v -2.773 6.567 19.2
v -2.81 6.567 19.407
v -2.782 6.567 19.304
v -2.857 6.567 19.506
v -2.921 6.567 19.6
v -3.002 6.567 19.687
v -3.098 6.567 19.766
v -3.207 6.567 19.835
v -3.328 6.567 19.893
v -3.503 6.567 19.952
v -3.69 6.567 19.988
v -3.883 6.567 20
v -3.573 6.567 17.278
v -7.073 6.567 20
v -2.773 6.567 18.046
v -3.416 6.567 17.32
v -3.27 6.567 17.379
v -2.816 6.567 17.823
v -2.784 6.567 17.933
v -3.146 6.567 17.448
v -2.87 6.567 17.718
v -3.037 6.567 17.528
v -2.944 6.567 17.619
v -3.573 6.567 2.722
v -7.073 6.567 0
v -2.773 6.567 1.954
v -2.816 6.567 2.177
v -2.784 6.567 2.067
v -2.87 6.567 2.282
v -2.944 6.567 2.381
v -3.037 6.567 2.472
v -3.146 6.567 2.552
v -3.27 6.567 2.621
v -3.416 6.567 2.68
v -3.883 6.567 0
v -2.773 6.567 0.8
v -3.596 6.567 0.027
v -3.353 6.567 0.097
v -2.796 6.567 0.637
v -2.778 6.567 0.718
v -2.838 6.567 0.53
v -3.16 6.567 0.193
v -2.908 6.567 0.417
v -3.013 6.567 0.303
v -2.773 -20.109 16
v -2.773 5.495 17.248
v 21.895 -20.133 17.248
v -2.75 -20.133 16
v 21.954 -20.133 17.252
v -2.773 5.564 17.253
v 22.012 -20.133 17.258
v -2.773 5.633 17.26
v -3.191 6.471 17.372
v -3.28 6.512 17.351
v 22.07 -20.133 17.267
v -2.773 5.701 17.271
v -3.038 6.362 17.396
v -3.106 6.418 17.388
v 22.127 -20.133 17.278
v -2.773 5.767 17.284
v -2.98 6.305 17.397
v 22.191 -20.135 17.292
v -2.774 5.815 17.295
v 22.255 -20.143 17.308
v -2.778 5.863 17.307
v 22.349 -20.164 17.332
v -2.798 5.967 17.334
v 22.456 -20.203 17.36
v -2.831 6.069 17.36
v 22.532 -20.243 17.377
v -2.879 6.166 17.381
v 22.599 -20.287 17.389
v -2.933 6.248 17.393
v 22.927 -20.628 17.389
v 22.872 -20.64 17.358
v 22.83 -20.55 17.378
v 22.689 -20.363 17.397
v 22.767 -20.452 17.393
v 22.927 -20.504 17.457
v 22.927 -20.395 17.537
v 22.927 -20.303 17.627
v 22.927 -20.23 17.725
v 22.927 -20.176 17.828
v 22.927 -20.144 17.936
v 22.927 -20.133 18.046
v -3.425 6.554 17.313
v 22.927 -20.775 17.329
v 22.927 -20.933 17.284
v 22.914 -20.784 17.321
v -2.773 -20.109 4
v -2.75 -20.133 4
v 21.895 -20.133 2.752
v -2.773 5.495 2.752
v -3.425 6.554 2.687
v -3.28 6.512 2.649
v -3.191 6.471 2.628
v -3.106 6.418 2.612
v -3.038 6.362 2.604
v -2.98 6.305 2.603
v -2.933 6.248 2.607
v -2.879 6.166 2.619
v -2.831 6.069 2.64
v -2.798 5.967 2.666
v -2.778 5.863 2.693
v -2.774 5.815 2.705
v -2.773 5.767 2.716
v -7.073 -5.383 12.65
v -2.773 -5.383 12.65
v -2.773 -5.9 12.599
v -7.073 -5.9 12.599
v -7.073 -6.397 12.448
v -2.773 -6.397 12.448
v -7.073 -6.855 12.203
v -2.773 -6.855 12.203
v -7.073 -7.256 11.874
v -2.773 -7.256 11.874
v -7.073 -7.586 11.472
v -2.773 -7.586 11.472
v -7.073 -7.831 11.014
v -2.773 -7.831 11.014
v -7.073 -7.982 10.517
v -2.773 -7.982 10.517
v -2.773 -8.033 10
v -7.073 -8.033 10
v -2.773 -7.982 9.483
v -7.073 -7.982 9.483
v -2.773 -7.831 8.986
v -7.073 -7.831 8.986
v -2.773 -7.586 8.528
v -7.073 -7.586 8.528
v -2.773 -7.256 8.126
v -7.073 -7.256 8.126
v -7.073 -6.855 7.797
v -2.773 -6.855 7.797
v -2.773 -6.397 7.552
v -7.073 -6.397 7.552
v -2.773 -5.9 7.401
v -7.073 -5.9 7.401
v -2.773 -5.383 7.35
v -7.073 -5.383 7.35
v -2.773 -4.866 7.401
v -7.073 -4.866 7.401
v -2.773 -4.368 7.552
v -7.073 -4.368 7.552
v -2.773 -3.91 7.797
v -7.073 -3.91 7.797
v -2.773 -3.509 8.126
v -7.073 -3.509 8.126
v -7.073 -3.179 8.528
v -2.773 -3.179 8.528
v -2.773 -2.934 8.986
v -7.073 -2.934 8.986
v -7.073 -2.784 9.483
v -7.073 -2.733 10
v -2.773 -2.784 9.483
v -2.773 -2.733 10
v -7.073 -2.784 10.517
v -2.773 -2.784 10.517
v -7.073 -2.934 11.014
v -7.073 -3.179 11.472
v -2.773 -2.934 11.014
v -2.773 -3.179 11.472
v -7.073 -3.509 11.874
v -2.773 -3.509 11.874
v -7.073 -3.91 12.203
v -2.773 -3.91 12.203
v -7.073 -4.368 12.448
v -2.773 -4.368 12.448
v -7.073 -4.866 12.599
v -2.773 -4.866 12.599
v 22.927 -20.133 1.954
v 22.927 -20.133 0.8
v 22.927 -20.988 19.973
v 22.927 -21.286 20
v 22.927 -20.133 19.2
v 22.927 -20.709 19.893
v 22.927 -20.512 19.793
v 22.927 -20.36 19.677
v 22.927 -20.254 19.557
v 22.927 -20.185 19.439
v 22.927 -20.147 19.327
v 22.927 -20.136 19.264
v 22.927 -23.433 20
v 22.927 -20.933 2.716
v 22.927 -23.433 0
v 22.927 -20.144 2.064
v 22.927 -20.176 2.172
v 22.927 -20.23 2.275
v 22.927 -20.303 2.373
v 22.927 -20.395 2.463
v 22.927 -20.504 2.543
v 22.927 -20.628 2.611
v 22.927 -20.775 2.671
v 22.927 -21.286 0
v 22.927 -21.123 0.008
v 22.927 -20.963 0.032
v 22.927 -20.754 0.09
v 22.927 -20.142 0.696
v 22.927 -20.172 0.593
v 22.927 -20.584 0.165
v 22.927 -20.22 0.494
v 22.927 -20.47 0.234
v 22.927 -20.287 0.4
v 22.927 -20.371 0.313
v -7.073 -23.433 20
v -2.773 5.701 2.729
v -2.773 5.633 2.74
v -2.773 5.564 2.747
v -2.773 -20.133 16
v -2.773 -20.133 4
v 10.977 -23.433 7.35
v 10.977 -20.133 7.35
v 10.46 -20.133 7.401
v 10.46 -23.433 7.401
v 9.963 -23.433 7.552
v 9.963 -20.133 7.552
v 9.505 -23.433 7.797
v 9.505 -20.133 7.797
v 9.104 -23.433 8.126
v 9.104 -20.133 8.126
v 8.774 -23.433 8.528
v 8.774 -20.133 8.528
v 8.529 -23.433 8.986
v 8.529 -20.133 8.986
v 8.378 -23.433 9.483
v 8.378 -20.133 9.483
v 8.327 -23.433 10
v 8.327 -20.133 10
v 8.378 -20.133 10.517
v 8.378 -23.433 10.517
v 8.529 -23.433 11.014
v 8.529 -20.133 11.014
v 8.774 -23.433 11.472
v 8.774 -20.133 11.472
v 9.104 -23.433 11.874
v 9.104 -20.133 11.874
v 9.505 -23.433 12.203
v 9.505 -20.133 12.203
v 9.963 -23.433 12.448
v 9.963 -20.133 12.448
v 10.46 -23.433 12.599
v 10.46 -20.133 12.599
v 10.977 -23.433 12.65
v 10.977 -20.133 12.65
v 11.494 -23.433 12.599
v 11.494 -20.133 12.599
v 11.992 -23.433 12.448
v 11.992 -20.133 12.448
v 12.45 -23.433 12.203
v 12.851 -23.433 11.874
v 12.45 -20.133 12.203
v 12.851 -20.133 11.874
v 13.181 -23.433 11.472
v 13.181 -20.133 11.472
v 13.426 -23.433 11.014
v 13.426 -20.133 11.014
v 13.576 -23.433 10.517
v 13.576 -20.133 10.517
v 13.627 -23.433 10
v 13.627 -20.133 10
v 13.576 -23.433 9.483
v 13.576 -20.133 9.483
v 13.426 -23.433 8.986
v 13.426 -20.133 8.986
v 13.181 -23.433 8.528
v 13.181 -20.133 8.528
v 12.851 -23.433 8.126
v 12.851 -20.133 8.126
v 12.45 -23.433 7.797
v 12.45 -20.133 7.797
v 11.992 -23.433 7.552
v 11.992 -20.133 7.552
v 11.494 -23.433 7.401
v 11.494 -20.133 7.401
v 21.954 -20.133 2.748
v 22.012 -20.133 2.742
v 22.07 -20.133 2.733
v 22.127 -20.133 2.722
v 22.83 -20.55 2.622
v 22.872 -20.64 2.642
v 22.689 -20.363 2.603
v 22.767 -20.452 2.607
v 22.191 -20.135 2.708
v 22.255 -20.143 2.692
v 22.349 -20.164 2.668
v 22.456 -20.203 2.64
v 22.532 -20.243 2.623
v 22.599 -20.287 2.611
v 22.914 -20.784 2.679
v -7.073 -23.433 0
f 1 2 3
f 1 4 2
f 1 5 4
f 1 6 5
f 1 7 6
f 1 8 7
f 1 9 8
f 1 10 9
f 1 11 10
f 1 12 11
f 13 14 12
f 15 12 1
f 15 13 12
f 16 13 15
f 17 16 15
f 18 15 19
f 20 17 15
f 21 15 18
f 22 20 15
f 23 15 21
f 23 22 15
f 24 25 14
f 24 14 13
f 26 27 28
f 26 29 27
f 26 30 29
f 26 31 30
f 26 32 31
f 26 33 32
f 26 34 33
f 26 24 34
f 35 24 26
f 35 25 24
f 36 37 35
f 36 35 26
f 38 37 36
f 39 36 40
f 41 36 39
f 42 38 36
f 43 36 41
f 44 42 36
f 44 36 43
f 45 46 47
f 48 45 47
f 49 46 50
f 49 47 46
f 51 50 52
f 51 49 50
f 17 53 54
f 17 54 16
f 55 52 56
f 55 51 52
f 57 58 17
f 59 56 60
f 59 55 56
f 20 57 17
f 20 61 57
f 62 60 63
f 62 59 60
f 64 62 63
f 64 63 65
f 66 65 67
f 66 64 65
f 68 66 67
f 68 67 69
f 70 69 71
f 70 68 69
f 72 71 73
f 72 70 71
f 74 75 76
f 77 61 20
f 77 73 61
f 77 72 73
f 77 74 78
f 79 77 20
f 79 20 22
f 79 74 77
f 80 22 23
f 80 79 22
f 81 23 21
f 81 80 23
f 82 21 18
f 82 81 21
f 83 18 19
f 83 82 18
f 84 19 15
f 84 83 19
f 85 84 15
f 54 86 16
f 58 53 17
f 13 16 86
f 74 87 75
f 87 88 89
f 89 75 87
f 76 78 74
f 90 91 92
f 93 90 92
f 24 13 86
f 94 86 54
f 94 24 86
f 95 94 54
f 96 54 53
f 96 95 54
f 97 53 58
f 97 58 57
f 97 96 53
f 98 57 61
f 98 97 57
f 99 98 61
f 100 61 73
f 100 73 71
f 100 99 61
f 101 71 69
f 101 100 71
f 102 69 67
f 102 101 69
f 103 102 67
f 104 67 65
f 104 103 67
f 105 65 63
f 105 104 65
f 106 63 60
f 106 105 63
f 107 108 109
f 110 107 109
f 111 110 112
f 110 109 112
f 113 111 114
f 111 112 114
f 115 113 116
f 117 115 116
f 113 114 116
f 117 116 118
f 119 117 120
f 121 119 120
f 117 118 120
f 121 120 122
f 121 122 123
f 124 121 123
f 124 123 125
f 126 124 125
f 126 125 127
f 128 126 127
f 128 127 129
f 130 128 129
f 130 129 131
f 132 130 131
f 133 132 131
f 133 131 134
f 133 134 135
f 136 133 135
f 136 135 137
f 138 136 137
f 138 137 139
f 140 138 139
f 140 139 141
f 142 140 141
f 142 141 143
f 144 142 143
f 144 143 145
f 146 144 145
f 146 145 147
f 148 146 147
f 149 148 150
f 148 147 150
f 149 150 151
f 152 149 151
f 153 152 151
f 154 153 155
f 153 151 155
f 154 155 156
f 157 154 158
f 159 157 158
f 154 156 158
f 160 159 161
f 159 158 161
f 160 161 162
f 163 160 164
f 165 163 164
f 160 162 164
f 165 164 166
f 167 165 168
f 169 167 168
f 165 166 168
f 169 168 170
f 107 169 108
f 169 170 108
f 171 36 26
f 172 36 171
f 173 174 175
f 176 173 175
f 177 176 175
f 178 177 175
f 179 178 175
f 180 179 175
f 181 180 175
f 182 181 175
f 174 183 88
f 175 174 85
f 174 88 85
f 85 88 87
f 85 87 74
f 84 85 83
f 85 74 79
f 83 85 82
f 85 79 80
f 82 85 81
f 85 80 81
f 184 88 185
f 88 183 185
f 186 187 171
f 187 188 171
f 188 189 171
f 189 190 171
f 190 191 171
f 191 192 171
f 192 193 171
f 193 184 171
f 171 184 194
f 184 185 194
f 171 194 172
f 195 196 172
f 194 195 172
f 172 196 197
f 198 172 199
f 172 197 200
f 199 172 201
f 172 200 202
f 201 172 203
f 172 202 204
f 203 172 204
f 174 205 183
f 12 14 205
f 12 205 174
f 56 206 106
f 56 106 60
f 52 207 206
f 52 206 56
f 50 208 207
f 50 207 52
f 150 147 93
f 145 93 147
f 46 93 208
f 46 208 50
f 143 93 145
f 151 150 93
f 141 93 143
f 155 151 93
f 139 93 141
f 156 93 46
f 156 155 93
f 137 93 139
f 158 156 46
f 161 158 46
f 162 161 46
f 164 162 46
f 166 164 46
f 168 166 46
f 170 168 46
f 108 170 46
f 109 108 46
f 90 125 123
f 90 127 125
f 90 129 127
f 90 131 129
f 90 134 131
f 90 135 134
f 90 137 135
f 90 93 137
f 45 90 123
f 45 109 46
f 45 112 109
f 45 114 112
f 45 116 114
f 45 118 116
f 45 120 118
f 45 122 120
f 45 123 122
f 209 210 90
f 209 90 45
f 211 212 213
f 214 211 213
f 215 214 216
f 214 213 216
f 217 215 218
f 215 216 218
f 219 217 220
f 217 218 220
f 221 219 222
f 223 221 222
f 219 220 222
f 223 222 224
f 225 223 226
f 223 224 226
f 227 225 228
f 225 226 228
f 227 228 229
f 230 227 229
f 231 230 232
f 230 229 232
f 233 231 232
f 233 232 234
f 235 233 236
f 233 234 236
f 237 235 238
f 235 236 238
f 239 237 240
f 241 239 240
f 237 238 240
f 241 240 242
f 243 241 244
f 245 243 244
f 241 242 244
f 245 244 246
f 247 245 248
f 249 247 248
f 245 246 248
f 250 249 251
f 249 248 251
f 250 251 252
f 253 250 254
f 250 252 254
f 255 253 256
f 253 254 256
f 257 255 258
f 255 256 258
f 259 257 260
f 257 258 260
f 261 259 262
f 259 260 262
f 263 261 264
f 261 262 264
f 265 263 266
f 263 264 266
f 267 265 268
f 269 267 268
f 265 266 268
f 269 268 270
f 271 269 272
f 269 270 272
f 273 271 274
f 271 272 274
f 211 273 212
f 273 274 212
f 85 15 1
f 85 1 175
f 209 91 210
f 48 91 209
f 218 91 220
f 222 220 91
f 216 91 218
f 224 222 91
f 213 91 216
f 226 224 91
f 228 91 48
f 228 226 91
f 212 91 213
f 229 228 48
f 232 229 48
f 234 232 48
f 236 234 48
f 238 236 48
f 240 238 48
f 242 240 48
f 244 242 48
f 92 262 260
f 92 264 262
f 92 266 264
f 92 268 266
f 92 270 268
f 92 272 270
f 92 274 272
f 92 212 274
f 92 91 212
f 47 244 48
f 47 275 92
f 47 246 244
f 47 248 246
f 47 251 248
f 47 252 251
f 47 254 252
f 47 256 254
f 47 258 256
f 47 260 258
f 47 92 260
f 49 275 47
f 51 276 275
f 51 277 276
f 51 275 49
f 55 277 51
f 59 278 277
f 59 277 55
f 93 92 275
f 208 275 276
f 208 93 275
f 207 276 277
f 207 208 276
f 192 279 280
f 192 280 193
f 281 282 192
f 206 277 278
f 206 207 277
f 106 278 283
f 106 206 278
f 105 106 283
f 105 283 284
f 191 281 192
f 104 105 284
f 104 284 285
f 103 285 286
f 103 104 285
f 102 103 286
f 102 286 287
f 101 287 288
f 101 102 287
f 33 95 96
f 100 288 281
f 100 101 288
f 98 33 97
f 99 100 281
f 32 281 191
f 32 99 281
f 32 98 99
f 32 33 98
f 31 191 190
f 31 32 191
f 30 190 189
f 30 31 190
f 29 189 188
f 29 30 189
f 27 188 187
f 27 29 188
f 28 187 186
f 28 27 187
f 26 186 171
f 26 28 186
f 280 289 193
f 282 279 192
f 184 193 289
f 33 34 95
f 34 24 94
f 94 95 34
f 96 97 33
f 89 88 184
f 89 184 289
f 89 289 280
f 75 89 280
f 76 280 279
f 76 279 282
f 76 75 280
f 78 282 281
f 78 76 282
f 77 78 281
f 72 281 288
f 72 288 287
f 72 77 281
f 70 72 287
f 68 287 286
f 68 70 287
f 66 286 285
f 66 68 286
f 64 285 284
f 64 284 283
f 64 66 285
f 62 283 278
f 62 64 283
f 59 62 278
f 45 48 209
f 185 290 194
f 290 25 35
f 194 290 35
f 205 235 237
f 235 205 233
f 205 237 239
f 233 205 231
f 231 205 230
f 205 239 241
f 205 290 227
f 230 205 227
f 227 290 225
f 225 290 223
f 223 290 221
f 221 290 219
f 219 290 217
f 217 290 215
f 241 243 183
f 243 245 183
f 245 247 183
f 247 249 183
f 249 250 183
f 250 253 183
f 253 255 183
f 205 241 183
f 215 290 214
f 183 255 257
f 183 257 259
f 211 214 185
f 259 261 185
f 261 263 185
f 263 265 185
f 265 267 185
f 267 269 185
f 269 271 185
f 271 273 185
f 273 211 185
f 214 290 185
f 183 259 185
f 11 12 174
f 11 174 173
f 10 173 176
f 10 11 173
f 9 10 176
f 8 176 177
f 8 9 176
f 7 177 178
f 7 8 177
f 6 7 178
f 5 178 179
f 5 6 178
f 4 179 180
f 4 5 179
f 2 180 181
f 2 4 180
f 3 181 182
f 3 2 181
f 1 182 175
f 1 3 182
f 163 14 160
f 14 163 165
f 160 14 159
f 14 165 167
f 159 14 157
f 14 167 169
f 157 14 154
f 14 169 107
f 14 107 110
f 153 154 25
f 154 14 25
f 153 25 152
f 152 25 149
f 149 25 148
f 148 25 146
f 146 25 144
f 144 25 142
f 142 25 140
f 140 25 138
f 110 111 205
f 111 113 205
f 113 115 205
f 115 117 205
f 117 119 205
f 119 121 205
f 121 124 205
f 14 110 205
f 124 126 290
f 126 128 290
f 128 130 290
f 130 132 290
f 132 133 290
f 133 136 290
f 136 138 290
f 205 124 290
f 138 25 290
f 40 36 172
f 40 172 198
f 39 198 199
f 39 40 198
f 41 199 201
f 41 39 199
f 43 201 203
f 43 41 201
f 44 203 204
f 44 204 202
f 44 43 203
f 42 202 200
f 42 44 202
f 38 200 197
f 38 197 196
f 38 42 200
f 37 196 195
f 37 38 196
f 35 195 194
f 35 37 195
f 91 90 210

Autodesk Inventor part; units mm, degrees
ref_plane "YZ Plane" through (0, 0, 0) normal (1, 0, 0) x (0, 1, 0)
ref_plane "XZ Plane" through (0, 0, 0) normal (0, 1, 0) x (-1, 0, 0)
ref_plane "XY Plane" through (0, 0, 0) normal (0, 0, 1) x (1, 0, 0)
sketch "Szkic1" plane through (0, 0, 0) normal (0, 0, 1) x (1, 0, 0)
  line L0 (-7.0726, 6.5674) -> (-7.0726, -23.4326)
  line L1 (-7.0726, -23.4326) -> (22.9274, -23.4326)
  line L2 (22.9274, -23.4326) -> (22.9274, -20.1326)
  line L3 (-7.0726, 6.5674) -> (-2.7726, 6.5674)
  line L4 (-2.7726, 6.5674) -> (22.9274, -20.1326)
  point P0 (0, 0)
  dimension "d0" = 30
  dimension "d1" = 30
  dimension "d2" = 3.3
  dimension "d3" = 4.3
extrude "Wyciągnięcie proste1" add sketch "Szkic1" along normal blind 20
sketch "Szkic2" plane through (22.9274, -23.4326, 0) normal (1, 0, 0) x (0, 0, -1)
  line L0 (0, 0) -> (0, 3.3) projected
  line L1 (0, 3.3) -> (-20, 3.3) projected
  line L2 (-20, 0) -> (-20, 3.3) projected
  line L3 (0, 0) -> (-20, 0) projected
  line L4 (0, 3.3) -> (0, 30) projected
  line L5 (0, 30) -> (-20, 30) projected
  line L6 (-20, 3.3) -> (-20, 30) projected
  line L7 (0, 3.3) -> (-20, 3.3) projected
  line L8 (0, 3.3) -> (-20, 3.3) projected
  line L9 (0, 30) -> (-20, 30) projected
  line L10 (-4, 3.3) -> (-16, 3.3)
  line L11 (-16, 3.3) -> (-16, 30)
  line L12 (-16, 30) -> (-4, 30)
  line L13 (-4, 30) -> (-4, 3.3)
  point P0 (0, 23.4326)
  dimension "d6" = 12
  dimension "d7" = 4
  dimension "d8" = 4
extrude "Wyciągnięcie proste2" cut sketch "Szkic2" against normal blind 25.7 contours L1 L11 L5 L13
chamfer "Faza1" distance 1.3 distance2 18.5 1 edges at (10.0774, -6.7826, 16) measured on face at (14.3607, -11.2326, 17.3333)
chamfer "Faza2" distance 1.3 distance2 18.5 1 edges at (10.0774, -6.7826, 4) measured on face at (5.7941, -2.3326, 2.6667)
fillet "Zaokrąglenie1" radius 0.8 4 edges at (10.0774, -6.7826, 17.3) (10.0774, -6.7826, 2.7) (10.0774, -6.7826, 20) (10.0774, -6.7826, 0)
fillet "Zaokrąglenie2" radius 0.8 2 edges at (22.9274, -20.1326, 10) (-2.7726, 6.5674, 10)
sketch "Szkic3" plane through (-7.0726, -23.4326, 0) normal (0, -1, 0) x (1, 0, 0)
  line L0 (0, 0) -> (30, 0) projected
  line L1 (30, 0) -> (30, 20) projected
  line L2 (0, 20) -> (30, 20) projected
  line L3 (0, 0) -> (0, 20) projected
  point P0 (7.0726, 0)
  point P1 (18.05, 10)
  dimension "d19" = 11.95
hole "Otwór1" at (10.9774, -23.4326, 10) direction (0, 1, 0) diameter 5.3 end through all
sketch "Szkic4" plane through (-7.0726, -23.4326, 0) normal (-1, 0, 0) x (0, 0, 1)
  line L0 (0, 30) -> (0, 0) projected
  line L1 (0, 0) -> (20, 0) projected
  line L2 (20, 30) -> (20, 0) projected
  line L3 (0, 30) -> (20, 30) projected
  point P0 (0, 23.4326)
  point P1 (10, 18.05)
  dimension "d27" = 11.95
hole "Otwór2" at (-7.0726, -5.3826, 10) direction (1, 0, 0) diameter 5.3 end through all
properties part number "COTS_GENERIC_20x20mm_Angle_Bracket" material "Stal nierdzewna 440C"
